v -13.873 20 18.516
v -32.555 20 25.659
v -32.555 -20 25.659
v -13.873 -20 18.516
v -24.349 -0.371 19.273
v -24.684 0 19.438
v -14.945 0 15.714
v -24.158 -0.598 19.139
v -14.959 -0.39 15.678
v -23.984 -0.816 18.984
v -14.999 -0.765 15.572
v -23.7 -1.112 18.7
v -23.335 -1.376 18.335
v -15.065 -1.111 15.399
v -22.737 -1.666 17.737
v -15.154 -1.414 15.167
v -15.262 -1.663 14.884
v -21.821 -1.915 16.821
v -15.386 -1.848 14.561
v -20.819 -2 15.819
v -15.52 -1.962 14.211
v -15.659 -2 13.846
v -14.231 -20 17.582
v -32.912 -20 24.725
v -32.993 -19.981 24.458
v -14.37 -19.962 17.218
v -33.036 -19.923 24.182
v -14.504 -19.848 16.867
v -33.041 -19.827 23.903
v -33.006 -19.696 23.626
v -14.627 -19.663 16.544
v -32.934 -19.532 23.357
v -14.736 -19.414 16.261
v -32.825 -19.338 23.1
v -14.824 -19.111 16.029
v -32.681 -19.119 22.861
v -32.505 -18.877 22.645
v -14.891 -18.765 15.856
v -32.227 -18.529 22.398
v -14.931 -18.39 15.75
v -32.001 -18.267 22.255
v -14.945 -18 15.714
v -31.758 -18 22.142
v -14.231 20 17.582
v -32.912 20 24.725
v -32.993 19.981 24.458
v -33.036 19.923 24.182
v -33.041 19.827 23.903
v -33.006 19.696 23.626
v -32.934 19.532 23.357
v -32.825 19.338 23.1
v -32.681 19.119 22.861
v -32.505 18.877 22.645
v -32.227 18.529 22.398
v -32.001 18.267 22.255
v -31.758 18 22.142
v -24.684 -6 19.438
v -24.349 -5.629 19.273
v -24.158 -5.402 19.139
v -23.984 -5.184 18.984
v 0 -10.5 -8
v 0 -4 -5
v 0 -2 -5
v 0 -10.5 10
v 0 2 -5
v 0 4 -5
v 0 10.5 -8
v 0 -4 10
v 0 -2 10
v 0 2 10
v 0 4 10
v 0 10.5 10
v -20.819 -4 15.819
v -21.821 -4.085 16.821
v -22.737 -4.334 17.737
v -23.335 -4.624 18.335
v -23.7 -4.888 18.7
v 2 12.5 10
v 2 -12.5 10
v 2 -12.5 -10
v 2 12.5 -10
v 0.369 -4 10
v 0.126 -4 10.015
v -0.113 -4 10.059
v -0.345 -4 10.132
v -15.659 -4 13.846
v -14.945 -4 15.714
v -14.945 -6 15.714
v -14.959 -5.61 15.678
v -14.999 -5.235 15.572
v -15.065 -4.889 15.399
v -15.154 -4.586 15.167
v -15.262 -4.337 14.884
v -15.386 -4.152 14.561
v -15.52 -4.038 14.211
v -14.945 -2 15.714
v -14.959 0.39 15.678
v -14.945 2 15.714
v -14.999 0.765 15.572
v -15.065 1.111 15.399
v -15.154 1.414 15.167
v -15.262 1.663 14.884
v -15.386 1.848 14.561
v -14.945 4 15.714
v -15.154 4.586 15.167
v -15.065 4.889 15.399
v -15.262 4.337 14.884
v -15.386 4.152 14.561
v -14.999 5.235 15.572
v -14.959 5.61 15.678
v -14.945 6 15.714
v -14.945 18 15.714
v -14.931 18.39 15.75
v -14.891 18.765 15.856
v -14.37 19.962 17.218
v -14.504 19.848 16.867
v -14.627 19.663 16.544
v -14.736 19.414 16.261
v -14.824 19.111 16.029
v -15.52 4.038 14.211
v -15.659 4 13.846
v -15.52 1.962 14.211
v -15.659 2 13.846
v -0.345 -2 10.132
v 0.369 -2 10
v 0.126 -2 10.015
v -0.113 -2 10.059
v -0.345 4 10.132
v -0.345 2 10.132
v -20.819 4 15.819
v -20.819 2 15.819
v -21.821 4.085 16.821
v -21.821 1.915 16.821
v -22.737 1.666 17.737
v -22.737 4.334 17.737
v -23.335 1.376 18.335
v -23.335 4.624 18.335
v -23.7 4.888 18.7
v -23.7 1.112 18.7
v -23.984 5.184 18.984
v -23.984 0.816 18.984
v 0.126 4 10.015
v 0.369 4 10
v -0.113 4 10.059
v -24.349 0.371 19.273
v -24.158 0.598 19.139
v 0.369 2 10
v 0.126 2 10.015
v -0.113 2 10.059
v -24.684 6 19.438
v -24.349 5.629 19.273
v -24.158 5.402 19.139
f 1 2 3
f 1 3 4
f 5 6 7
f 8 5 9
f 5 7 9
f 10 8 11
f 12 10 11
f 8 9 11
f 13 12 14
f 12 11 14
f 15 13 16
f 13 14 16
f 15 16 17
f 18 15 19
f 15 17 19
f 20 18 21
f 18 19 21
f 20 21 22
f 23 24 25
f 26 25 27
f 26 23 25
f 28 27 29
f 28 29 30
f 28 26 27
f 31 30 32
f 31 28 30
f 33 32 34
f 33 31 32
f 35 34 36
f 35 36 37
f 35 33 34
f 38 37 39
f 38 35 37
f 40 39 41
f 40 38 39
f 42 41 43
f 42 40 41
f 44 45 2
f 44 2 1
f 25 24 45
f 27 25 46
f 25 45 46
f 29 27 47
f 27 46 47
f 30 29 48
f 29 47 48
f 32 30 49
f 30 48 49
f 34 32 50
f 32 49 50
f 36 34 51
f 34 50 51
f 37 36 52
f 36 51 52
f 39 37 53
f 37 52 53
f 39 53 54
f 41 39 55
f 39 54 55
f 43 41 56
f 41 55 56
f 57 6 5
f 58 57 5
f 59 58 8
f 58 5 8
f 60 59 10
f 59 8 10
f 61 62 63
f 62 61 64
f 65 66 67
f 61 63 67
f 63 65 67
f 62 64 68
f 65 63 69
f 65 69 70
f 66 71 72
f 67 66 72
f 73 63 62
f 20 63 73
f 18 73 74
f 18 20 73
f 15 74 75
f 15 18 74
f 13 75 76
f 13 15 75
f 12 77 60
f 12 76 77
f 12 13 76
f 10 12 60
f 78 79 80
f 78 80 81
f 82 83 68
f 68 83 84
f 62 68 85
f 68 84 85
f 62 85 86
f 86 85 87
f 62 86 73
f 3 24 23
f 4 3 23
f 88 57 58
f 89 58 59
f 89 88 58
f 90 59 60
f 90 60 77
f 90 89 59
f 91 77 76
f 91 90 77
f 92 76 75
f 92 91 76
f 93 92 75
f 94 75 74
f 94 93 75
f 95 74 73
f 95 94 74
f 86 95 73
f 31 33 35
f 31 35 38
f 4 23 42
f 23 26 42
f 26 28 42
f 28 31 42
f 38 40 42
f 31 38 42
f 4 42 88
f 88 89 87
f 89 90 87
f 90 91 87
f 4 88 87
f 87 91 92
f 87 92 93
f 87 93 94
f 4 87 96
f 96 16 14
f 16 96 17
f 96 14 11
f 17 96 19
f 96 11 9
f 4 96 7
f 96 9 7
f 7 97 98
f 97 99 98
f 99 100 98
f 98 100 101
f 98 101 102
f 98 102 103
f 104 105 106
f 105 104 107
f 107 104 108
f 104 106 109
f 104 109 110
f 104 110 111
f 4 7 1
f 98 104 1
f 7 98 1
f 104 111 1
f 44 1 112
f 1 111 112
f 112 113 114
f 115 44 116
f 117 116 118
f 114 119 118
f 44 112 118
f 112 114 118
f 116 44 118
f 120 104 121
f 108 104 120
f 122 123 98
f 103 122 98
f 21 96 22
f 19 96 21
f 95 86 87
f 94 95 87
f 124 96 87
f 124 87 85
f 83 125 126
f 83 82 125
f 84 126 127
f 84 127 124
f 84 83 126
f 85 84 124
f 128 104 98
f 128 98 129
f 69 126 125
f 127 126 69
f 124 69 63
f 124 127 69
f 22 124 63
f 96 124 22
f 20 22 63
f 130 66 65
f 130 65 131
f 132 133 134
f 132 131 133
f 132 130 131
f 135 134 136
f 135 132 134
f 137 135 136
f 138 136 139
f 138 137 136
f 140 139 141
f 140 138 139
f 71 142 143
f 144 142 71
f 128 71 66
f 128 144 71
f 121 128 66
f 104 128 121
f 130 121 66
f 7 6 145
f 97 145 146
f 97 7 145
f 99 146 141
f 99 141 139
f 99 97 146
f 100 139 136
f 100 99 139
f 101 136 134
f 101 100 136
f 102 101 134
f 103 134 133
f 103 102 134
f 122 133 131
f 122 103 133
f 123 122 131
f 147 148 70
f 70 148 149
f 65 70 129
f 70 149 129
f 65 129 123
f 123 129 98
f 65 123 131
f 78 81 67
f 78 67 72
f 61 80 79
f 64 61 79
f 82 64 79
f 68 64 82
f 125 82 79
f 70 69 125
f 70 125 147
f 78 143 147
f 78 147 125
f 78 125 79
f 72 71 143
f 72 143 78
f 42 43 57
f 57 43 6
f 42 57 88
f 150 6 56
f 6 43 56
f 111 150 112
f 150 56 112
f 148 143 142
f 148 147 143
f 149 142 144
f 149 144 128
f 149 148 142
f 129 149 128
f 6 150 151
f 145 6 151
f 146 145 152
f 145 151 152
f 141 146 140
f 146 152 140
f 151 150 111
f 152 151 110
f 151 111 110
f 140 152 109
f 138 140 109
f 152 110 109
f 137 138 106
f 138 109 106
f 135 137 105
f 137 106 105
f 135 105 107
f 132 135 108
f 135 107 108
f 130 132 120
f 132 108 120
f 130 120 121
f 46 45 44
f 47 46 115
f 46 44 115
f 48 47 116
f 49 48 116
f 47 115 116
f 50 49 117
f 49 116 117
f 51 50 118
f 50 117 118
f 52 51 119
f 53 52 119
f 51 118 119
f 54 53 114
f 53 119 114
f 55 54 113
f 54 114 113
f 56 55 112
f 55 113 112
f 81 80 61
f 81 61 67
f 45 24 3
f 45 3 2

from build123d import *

# Parameters (mm, degrees)
SKETCH1_W           = 25
SKETCH1_H           = 20
BOSS_EXTRUDE1_DEPTH = 2
BOSS_EXTRUDE2_DEPTH = 4
CUT_EXTRUDE1_DEPTH  = 2
SKETCH5_W           = 20
SKETCH5_H           = 40
BOSS_EXTRUDE5_DEPTH = 3
FILLET3_R           = 2
CHAMFER1_SIZE       = 2
FILLET4_R           = 2


with BuildPart() as part:
    # Sketch1 → Boss-Extrude1 (new body)
    with BuildSketch(Plane.YZ):
        Rectangle(SKETCH1_W, SKETCH1_H)
    extrude(amount=BOSS_EXTRUDE1_DEPTH)

    # Sketch2 → Boss-Extrude2 (add, symmetric)
    with BuildSketch(Plane(origin=(0, 0, 0), x_dir=(-1, 0, 0), z_dir=(0, 1, 0))):
        Polygon((0, -5), (24.285410332, 19.285410332), (0, 10), align=None)
    extrude(amount=BOSS_EXTRUDE2_DEPTH, both=True)

    # Sketch2<2> → Cut-Extrude1 (cut, symmetric)
    with BuildSketch(Plane(origin=(0, 0, 0), x_dir=(-1, 0, 0), z_dir=(0, 1, 0))):
        Polygon((0, -5), (24.285410332, 19.285410332), (0, 10), align=None)
    extrude(amount=CUT_EXTRUDE1_DEPTH, both=True, mode=Mode.SUBTRACT)

    # Sketch5 → Boss-Extrude5 (add)
    with BuildSketch(Plane(origin=(3.335798817, 0, 8.724573298), x_dir=(0.9340542435228668, 0, -0.3571311665997872), z_dir=(0.3571311665997872, 0, 0.9340542435228668))):
        with Locations((-29.571311666, 0)):
            Rectangle(SKETCH5_W, SKETCH5_H)
    extrude(amount=BOSS_EXTRUDE5_DEPTH)

    # Fillet3
    fillet3_edges = [part.edges().sort_by_distance(p)[0] for p in [
        (-19.615139114, -4, 17.499754499),
        (-24.285410332, 3, 19.285410332),
        (-19.615139114, 4, 17.499754499),
        (-24.285410332, -3, 19.285410332),
        (-19.615139114, -2, 17.499754499),
        (-19.615139114, 2, 17.499754499),
        (-33.625952767, 0, 22.856721998),
        (-24.285410332, -20, 19.285410332),
        (-24.285410332, 20, 19.285410332),
    ]]
    fillet(fillet3_edges, radius=FILLET3_R - 0.0001)  # a hair under: the kernel refuses the full size

    # Chamfer1
    chamfer1_edges = [part.edges().sort_by_distance(p)[0] for p in [
        (0, -12.5, 0),
        (0, 0, -10),
        (0, 12.5, 0),
    ]]
    chamfer(chamfer1_edges, length=CHAMFER1_SIZE - 0.0001)  # a hair under: the kernel refuses the full size

    # Fillet4
    fillet4_edges = [part.edges().sort_by_distance(p)[0] for p in [
        (0, 3, 10),
        (0, -3, 10),
    ]]
    fillet(fillet4_edges, radius=FILLET4_R)


solid = part.part
